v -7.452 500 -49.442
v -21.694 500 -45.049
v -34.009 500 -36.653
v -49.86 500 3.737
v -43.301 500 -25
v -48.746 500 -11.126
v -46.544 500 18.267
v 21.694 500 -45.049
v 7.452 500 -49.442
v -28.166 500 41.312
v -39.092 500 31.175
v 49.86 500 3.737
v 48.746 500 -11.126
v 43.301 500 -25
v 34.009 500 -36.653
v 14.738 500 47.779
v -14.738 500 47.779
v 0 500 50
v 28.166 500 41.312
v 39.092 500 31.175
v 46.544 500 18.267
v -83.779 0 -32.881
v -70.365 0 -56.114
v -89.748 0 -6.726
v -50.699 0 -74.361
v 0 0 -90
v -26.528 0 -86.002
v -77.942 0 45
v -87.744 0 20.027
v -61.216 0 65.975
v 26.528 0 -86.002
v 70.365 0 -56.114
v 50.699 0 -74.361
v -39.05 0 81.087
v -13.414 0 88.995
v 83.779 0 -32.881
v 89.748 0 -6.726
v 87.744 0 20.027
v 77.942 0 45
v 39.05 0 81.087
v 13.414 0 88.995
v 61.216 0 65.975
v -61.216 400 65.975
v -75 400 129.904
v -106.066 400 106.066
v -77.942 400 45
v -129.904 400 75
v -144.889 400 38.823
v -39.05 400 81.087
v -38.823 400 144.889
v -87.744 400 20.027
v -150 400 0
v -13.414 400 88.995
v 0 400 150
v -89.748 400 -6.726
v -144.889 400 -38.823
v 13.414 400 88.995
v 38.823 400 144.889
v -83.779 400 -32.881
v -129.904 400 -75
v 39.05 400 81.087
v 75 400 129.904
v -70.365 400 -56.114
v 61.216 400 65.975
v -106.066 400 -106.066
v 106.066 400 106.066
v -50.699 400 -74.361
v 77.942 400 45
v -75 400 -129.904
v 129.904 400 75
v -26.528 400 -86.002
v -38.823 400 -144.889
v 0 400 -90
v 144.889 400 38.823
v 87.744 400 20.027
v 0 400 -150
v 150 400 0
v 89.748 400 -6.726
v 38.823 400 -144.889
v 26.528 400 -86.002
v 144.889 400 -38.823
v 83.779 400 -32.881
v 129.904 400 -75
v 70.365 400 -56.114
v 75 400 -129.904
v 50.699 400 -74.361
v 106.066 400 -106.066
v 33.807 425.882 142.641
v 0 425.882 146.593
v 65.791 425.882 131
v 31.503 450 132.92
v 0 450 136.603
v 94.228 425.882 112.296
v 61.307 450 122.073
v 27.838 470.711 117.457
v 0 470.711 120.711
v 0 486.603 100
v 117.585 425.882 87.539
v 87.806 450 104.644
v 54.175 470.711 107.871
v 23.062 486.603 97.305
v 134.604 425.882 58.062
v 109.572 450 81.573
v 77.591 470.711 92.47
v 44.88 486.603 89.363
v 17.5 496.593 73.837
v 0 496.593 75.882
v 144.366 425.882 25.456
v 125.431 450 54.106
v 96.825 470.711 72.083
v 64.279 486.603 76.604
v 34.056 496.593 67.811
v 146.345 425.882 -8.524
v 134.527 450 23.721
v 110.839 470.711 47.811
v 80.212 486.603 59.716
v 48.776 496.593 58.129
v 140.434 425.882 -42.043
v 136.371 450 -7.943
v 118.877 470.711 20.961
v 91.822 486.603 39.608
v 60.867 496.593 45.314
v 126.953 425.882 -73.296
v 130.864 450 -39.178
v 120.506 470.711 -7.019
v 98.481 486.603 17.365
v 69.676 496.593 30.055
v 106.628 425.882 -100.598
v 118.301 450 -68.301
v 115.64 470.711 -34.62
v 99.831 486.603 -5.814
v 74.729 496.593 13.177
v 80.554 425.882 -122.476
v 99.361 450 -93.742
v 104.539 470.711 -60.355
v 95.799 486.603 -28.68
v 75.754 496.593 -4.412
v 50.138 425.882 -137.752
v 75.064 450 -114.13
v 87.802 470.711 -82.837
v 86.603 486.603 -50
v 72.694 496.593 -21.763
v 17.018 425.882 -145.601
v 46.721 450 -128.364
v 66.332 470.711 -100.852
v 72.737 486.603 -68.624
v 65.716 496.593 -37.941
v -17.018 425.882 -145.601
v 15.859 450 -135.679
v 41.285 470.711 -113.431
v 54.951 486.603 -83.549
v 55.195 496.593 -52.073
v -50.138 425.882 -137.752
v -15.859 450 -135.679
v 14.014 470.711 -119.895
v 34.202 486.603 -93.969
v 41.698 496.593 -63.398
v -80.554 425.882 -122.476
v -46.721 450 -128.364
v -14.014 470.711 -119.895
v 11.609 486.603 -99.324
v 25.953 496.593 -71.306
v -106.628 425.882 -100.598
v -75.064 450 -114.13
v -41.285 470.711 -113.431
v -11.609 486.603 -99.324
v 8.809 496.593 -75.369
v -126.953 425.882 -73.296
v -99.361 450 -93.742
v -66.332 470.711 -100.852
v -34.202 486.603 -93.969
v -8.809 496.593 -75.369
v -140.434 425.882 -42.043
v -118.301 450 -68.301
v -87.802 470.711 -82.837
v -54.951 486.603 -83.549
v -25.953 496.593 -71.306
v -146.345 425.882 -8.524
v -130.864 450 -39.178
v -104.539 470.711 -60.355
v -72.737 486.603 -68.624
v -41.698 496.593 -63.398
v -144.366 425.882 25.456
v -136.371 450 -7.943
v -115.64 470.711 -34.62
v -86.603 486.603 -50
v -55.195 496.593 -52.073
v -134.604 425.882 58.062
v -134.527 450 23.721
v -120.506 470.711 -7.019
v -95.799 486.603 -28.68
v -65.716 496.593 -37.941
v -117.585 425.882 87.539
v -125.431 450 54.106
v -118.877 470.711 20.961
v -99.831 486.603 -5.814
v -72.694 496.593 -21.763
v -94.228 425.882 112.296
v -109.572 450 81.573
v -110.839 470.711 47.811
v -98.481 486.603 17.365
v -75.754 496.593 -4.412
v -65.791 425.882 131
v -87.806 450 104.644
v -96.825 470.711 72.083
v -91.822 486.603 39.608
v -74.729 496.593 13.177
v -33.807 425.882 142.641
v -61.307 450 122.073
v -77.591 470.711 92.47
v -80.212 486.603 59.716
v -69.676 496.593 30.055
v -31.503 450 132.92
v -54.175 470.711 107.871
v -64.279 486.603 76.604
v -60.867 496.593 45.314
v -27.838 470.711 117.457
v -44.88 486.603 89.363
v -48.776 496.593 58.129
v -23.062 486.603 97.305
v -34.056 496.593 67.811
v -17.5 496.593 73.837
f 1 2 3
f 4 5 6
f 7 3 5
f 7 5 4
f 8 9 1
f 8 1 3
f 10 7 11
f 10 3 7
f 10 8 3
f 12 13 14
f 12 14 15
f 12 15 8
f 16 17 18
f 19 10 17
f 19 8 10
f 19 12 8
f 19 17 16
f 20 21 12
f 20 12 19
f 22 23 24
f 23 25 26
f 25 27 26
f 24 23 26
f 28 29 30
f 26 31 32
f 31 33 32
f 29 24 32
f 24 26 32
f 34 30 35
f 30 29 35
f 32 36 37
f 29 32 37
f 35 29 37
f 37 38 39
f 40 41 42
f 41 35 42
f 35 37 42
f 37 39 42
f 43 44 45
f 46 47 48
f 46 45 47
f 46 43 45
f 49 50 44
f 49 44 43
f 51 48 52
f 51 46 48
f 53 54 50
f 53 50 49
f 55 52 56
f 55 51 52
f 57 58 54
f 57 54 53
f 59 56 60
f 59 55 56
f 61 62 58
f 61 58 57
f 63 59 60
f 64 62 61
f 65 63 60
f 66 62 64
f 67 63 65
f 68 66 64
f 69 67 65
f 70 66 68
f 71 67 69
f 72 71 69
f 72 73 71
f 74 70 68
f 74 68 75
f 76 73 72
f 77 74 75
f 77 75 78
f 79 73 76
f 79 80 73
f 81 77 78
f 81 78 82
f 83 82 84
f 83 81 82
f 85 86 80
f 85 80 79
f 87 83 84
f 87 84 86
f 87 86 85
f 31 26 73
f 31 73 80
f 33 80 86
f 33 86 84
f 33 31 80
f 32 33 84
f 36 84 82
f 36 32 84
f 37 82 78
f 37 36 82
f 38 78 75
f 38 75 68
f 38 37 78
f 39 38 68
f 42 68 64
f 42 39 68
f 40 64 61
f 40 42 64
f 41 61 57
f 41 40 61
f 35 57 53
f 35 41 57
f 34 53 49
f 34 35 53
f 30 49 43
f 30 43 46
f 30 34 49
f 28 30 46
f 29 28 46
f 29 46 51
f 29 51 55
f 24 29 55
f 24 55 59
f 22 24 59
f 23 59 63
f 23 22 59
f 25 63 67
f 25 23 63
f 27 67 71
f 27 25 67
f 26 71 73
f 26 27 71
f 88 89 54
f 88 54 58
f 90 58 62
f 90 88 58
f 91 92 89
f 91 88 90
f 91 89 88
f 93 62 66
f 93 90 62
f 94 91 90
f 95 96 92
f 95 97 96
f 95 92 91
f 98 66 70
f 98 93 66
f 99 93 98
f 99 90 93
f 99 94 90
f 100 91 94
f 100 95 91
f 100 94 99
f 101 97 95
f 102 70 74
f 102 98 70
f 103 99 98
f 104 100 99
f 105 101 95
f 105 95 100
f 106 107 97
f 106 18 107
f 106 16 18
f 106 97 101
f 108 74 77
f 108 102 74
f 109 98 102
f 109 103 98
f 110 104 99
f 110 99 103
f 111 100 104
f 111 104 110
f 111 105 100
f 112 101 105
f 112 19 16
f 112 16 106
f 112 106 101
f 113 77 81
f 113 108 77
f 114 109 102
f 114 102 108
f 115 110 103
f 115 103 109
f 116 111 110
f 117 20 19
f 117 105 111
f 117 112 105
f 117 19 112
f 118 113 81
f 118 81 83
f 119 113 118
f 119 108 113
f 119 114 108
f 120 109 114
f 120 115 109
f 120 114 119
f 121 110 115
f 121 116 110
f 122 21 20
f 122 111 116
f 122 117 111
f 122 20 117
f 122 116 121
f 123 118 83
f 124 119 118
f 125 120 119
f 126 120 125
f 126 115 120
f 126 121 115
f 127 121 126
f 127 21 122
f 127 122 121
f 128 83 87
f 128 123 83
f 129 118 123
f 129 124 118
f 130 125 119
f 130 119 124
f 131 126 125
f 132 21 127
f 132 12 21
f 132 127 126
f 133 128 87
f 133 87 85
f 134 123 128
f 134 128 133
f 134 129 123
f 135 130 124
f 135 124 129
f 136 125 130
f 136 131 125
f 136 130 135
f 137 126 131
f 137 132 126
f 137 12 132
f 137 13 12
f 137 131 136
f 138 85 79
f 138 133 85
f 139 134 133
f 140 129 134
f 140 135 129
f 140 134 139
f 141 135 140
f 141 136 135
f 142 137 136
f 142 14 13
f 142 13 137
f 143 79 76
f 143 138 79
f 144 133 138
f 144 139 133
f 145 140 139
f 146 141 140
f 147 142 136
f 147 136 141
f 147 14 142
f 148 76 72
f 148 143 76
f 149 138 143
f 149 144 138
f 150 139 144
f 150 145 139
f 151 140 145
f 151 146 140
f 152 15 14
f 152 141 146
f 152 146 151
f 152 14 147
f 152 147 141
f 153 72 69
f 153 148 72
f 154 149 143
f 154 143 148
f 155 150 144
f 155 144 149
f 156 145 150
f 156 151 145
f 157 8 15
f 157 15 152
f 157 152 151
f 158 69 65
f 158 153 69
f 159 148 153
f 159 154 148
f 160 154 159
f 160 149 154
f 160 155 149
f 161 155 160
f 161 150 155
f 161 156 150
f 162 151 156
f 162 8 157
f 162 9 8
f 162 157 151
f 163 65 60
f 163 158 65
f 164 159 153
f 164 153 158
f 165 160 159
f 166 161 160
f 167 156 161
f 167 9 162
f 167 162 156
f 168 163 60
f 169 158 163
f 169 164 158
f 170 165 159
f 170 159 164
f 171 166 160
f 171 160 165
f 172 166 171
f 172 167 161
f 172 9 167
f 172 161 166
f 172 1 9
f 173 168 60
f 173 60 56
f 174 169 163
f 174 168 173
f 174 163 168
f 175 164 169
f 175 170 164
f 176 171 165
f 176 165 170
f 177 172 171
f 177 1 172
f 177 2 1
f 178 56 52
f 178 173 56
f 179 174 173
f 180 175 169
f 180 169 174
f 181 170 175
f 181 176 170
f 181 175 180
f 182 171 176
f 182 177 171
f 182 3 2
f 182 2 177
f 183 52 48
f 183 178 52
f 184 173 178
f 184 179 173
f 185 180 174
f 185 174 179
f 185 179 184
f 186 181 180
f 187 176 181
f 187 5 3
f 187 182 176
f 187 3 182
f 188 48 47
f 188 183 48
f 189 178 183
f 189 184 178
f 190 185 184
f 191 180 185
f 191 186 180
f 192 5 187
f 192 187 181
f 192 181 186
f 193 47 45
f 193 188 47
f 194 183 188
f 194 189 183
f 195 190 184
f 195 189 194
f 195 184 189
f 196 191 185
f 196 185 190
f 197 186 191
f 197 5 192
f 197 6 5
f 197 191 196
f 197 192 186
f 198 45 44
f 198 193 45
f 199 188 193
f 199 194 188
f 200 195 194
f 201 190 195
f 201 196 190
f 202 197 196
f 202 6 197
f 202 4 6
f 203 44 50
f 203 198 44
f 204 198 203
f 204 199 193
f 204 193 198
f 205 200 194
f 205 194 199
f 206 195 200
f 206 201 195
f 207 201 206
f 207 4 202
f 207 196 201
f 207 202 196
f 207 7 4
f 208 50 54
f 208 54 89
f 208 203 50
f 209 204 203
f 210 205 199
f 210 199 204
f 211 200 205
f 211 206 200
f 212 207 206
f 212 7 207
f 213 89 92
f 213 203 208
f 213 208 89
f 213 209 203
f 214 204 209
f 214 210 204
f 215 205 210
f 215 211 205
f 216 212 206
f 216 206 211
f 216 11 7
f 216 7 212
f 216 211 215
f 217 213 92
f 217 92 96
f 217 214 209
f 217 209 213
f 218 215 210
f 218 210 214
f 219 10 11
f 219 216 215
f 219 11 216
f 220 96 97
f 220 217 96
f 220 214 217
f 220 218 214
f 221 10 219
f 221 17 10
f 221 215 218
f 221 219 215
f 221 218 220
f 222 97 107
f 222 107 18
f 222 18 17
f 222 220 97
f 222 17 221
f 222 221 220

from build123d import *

# Parameters (mm, degrees)
SKETCH1_R           = 150
BOSS_EXTRUDE1_DEPTH = 500
SKETCH2_R           = 150
SKETCH2_R_2         = 90
CUT_EXTRUDE1_DEPTH  = 400
FILLET1_R           = 100


with BuildPart() as part:
    # Sketch1 → Boss-Extrude1 (new body)
    with BuildSketch(Plane(origin=(0, 0, 0), x_dir=(1, 0, 0), z_dir=(0, 1, 0))):
        with Locations(Location((0, 0, 0), (0, 0, 270))):
            Circle(SKETCH1_R)
    extrude(amount=BOSS_EXTRUDE1_DEPTH)

    # Sketch2 → Cut-Extrude1 (cut)
    with BuildSketch(Plane.XZ):
        with Locations(Location((0, 0, 0), (0, 0, 270))):
            Circle(SKETCH2_R)
        with Locations(Location((0, 0, 0), (0, 0, 270))):
            Circle(SKETCH2_R_2, mode=Mode.SUBTRACT)
    extrude(amount=-CUT_EXTRUDE1_DEPTH, mode=Mode.SUBTRACT)

    # Fillet1
    fillet1_edges = [part.edges().sort_by_distance(p)[0] for p in [
        (0, 500, -150),
    ]]
    fillet(fillet1_edges, radius=FILLET1_R - 0.0001)  # a hair under: the kernel refuses the full size


solid = part.part
